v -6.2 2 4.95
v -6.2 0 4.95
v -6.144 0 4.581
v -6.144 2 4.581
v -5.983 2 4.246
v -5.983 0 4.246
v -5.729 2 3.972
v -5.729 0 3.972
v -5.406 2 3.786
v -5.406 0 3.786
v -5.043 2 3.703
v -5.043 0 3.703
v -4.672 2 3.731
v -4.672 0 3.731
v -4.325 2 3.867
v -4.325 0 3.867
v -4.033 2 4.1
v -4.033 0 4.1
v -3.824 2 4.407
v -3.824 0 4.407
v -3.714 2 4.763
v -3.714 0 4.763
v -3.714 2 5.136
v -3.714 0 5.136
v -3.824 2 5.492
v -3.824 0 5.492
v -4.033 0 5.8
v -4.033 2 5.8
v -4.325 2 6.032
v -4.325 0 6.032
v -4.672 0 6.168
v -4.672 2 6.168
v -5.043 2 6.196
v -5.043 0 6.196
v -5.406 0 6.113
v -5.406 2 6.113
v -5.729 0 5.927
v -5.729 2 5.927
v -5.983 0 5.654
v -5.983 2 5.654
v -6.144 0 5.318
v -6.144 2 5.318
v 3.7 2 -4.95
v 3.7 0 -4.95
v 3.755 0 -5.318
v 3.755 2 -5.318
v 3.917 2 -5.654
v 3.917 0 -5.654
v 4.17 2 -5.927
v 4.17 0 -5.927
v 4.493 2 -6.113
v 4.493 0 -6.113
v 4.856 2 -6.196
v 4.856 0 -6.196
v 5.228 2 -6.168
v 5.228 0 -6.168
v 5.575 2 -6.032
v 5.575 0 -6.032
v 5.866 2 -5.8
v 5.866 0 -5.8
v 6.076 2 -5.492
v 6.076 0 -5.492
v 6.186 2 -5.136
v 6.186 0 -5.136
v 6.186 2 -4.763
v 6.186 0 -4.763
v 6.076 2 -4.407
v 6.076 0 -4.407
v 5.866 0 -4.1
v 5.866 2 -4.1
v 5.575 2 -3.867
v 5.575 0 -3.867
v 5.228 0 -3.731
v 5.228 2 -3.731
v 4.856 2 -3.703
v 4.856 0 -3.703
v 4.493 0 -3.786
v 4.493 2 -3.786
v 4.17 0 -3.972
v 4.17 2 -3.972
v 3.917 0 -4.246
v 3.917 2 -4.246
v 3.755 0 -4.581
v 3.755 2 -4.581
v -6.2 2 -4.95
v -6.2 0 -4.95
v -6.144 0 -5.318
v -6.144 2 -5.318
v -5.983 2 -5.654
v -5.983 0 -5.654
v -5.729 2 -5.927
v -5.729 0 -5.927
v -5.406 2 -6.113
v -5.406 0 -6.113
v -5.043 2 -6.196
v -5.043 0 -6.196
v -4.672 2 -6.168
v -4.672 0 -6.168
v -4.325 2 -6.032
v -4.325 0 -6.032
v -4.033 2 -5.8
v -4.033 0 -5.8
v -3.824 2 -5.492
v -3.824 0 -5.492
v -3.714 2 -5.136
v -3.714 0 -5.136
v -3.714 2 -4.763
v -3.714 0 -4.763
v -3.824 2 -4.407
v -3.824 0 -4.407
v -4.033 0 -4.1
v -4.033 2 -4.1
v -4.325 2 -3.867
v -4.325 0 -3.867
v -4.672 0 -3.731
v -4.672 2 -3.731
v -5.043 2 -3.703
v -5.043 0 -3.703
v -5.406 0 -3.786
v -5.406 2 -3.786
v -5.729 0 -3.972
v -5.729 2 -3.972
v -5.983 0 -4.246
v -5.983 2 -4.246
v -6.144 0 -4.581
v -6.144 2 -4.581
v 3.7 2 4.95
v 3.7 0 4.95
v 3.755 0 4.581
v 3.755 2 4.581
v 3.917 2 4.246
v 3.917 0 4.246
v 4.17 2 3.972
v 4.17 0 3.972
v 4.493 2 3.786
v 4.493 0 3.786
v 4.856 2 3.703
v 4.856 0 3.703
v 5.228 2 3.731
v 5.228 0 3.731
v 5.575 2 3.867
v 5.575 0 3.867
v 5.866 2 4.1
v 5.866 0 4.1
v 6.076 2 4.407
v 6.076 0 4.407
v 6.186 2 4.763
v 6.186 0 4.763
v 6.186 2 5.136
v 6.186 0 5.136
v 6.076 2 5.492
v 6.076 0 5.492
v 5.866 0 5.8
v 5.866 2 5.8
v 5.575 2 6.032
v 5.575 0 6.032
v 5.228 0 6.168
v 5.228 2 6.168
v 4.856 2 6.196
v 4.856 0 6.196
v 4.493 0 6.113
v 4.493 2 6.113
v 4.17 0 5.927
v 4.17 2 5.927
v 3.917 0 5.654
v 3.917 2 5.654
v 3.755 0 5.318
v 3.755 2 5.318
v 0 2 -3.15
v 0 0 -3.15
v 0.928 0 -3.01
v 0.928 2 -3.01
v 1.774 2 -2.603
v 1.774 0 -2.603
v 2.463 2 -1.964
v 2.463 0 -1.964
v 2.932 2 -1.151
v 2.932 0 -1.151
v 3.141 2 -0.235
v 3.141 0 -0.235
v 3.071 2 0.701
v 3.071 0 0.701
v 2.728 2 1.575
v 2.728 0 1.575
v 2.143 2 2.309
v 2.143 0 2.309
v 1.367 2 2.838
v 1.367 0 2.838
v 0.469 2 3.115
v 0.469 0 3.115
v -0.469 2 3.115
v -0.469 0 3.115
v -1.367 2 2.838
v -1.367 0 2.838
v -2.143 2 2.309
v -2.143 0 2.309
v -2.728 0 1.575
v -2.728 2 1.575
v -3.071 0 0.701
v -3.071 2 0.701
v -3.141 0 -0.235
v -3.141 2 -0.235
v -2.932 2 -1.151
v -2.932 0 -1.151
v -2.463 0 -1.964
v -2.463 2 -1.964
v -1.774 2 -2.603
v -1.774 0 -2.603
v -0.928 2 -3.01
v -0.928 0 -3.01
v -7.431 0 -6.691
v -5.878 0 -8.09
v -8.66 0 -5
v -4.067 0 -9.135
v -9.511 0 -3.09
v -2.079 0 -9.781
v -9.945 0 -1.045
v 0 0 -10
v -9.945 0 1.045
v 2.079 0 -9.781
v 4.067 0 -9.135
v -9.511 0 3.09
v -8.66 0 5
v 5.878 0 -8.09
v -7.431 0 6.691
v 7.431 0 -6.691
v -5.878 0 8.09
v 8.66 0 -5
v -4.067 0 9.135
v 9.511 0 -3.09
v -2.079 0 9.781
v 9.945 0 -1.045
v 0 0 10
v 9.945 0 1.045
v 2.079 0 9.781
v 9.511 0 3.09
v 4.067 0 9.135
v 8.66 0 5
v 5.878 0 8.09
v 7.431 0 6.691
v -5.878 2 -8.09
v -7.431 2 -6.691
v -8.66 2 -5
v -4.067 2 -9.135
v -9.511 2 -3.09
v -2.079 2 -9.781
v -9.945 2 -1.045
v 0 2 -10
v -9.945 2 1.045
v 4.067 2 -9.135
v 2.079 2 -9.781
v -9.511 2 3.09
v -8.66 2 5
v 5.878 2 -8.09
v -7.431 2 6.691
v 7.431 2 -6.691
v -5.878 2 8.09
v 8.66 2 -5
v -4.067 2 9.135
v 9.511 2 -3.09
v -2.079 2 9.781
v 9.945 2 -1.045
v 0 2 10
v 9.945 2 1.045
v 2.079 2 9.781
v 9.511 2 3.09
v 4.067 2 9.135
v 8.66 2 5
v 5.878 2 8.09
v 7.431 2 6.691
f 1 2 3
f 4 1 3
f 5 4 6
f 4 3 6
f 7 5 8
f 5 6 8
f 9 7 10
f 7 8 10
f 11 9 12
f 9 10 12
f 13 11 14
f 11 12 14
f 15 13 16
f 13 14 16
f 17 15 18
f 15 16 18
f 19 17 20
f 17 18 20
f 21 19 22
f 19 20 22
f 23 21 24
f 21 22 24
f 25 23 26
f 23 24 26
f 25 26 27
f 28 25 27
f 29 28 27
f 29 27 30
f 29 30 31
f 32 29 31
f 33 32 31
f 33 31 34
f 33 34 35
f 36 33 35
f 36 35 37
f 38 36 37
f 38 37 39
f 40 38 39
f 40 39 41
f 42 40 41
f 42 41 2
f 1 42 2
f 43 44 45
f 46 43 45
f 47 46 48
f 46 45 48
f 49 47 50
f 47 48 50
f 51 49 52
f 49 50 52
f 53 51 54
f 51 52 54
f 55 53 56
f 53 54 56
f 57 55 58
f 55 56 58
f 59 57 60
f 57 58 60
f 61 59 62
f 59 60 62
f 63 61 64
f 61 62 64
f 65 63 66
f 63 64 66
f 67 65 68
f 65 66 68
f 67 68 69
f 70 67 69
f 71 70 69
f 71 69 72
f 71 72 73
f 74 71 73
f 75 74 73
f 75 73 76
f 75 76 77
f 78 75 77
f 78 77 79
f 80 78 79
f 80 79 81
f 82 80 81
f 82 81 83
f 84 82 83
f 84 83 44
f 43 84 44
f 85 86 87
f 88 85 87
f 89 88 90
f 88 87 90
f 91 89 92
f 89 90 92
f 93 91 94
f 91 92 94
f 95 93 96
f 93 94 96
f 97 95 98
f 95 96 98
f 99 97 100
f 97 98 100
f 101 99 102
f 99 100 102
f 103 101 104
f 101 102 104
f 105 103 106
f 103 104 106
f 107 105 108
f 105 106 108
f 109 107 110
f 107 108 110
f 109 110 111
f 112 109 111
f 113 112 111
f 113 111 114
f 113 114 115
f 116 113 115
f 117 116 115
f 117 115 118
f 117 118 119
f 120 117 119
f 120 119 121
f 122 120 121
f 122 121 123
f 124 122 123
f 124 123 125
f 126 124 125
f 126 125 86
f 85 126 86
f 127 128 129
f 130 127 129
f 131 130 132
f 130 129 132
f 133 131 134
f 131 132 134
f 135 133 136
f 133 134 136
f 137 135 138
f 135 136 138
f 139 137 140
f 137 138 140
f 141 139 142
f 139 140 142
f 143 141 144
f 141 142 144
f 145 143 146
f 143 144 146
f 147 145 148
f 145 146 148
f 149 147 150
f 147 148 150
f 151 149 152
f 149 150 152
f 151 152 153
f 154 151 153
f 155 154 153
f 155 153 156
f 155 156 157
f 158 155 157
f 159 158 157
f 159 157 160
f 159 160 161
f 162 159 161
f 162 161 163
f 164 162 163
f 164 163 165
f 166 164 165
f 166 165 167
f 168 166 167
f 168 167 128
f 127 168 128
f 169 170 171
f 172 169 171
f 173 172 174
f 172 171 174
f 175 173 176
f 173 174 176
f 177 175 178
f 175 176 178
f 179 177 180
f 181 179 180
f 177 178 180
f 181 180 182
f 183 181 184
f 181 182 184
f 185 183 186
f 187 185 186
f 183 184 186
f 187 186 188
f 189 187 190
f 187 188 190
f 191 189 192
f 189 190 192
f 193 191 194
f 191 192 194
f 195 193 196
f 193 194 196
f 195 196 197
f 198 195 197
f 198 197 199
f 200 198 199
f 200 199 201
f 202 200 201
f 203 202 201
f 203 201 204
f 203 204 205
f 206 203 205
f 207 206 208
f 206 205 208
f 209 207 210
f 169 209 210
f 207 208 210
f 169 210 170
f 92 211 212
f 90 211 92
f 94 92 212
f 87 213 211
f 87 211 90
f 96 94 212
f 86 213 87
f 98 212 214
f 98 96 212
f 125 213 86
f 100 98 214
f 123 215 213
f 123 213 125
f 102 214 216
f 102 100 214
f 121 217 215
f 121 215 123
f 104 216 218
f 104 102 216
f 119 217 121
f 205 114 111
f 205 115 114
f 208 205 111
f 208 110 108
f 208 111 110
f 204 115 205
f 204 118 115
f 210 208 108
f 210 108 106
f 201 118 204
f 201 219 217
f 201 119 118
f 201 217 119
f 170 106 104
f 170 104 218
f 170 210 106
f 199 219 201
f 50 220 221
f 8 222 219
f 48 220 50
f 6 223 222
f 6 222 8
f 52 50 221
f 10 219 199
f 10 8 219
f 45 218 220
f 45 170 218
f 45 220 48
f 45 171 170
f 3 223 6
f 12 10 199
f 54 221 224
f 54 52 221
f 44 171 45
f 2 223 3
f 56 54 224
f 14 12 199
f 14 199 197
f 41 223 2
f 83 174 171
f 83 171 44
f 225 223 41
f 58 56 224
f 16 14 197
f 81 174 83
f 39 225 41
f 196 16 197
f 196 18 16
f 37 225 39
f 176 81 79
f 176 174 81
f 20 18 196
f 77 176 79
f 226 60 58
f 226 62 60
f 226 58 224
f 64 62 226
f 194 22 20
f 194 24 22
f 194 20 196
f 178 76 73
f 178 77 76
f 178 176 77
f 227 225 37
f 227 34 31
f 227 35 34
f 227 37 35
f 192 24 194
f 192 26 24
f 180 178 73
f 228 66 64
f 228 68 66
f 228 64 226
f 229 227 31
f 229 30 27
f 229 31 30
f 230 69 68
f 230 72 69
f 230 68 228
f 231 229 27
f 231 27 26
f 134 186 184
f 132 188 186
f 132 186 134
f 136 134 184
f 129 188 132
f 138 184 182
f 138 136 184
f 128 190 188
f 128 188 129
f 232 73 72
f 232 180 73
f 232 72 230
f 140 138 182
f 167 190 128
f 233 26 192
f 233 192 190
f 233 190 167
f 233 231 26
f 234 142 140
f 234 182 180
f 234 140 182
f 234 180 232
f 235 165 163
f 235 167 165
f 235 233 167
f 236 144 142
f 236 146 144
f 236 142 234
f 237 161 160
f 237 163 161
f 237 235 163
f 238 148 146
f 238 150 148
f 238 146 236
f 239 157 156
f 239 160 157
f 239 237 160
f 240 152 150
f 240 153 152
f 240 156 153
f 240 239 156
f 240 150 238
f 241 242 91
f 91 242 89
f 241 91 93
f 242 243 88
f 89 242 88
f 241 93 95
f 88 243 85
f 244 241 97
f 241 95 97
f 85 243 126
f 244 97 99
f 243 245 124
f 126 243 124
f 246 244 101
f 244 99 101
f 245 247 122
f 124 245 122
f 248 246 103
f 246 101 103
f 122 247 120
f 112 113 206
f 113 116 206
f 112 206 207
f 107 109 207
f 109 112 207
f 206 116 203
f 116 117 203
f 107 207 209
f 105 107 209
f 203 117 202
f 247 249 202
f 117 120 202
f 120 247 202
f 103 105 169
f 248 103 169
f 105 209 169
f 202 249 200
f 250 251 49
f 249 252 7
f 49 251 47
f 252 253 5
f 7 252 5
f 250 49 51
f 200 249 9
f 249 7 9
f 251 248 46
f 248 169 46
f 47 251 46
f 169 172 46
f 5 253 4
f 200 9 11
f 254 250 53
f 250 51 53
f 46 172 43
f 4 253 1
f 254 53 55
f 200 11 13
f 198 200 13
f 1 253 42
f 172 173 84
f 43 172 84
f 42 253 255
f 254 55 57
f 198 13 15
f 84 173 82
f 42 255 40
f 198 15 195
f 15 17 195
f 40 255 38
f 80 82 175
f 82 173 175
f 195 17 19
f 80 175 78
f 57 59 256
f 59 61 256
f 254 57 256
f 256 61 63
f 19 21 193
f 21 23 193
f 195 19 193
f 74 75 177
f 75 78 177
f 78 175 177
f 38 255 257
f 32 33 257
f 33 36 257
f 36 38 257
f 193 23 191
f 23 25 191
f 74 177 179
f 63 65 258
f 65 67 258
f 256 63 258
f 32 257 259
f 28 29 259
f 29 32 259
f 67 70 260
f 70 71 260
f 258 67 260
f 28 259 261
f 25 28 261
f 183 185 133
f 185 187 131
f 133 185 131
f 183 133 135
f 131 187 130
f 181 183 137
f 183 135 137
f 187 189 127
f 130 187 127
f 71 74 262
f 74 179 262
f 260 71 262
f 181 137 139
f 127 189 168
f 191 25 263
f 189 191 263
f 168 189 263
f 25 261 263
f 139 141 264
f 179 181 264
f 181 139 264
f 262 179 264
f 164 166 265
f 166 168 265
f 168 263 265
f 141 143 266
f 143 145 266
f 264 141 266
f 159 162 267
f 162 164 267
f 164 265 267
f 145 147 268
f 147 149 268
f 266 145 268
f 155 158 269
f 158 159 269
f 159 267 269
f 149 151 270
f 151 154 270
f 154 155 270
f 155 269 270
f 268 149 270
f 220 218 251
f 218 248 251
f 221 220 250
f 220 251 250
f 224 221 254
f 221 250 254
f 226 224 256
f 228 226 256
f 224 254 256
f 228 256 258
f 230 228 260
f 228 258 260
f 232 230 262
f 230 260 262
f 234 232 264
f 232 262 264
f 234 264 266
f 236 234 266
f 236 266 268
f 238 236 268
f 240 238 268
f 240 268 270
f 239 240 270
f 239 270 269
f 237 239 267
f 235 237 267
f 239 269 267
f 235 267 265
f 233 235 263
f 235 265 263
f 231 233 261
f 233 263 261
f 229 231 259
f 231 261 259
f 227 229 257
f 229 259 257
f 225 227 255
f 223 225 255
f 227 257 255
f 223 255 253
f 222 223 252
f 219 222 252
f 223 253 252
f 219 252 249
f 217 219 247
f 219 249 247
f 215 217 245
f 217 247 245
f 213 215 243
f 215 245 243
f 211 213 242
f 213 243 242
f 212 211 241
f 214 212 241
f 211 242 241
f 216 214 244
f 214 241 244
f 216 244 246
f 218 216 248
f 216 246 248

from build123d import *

# Parameters (mm, degrees)
SKETCH_1_W              = 10
SKETCH_1_H              = 2
SKETCH_2_R              = 4.5
EXTRUDE_1_DEPTH         = 2.5
CUT_EXTRUDE_1_DEPTH     = 3.6
HOLE_WIZARD_3_0_3_1_D   = 3
HOLE_WIZARD_2_5_2_5_1_D = 2.5
CHAMFER_1_SIZE          = 0.140560122
CHAMFER_1_EDGE_2_SIZE   = 0.140560122
CHAMFER_1_EDGE_3_SIZE   = 0.140560122
CHAMFER_1_EDGE_4_SIZE   = 0.140560122
CHAMFER_1_EDGE_5_SIZE   = 0.140560122
CHAMFER_1_EDGE_6_SIZE   = 0.140560122
CHAMFER_1_EDGE_7_SIZE   = 0.140560122
CHAMFER_1_EDGE_8_SIZE   = 0.140560122
CHAMFER_1_EDGE_9_SIZE   = 0.140560122
CHAMFER_1_EDGE_10_SIZE  = 0.140560122
CHAMFER_1_EDGE_11_SIZE  = 0.140560122
CHAMFER_1_EDGE_12_SIZE  = 0.140560122
CHAMFER_1_EDGE_13_SIZE  = 0.140560122
CHAMFER_1_EDGE_14_SIZE  = 0.140560122
CHAMFER_1_EDGE_15_SIZE  = 0.140560122
CHAMFER_1_EDGE_16_SIZE  = 0.140560122
CHAMFER_1_EDGE_17_SIZE  = 0.140560122
CHAMFER_1_EDGE_18_SIZE  = 0.140560122
CHAMFER_1_EDGE_19_SIZE  = 0.140560122
CHAMFER_1_EDGE_20_SIZE  = 0.140560122
CHAMFER_1_EDGE_21_SIZE  = 0.140560122
CHAMFER_1_EDGE_22_SIZE  = 0.140560122
CHAMFER_1_EDGE_23_SIZE  = 0.140560122
CHAMFER_1_EDGE_24_SIZE  = 0.140560122
CHAMFER_1_EDGE_25_SIZE  = 0.140560122
CHAMFER_1_EDGE_26_SIZE  = 0.140560122
SKETCH_8_R              = 4.5
CUT_EXTRUDE_2_DEPTH     = 4.5
SKETCH_9_R              = 4.5
SKETCH_9_R_2            = 3.15
EXTRUDE_2_DEPTH         = 2


with BuildPart() as part:
    # Эскиз1 → Повернуть1 (revolve)
    with BuildSketch(Plane.XY, mode=Mode.PRIVATE) as revolve_1_sk:
        with Locations((5, 1)):
            Rectangle(SKETCH_1_W, SKETCH_1_H)
    revolve(revolve_1_sk.sketch.rotate(Axis((0, 2, 0), (0, -1, 0)), 270), axis=Axis((0, 2, 0), (0, -1, 0)))

    # Эскиз2 → Бобышка-Вытянуть1 (add)
    with BuildSketch(Plane(origin=(0, 2, 0), x_dir=(-1, 0, 0), z_dir=(0, 1, 0))):
        with Locations(Location((0, 0, 0), (0, 0, 90))):
            Circle(SKETCH_2_R)
    extrude(amount=EXTRUDE_1_DEPTH)

    # Эскиз3 → Вырез-Вытянуть1 (cut)
    with BuildSketch(Plane(origin=(0, 4.5, 0), x_dir=(-1, 0, 0), z_dir=(0, 1, 0))):
        Polygon((-2.711547104, 1.028354172), (-2.477853855, 0.610736123), (-2.878855735, 0.349556373), (-2.552010646, 0), (-2.878855735, -0.349556373), (-2.477853855, -0.610736123), (-2.711547104, -1.028354172), (-2.259693204, -1.185978483), (-2.386653211, -1.647387766), (-1.910207398, -1.692296084), (-1.923055709, -2.17068117), (-1.449707281, -2.100263587), (-1.347697199, -2.567822474), (-0.904955447, -2.386171406), (-0.694015426, -2.815731271), (-0.307610891, -2.533403615), (0, -2.9), (0.307610891, -2.533403615), (0.694015426, -2.815731271), (0.904955447, -2.386171406), (1.347697199, -2.567822474), (1.449707281, -2.100263587), (1.923055709, -2.17068117), (1.910207398, -1.692296084), (2.386653211, -1.647387766), (2.259693204, -1.185978483), (2.711547104, -1.028354172), (2.477853855, -0.610736123), (2.878855735, -0.349556373), (2.552010646, 0), (2.878855735, 0.349556373), (2.477853855, 0.610736123), (2.711547104, 1.028354172), (2.259693204, 1.185978483), (2.386653211, 1.647387766), (1.910207398, 1.692296084), (1.923055709, 2.17068117), (1.449707281, 2.100263587), (1.347697199, 2.567822474), (0.904955447, 2.386171406), (0.694015426, 2.815731271), (0.307610891, 2.533403615), (0, 2.9), (-0.307610891, 2.533403615), (-0.694015426, 2.815731271), (-0.904955447, 2.386171406), (-1.347697199, 2.567822474), (-1.449707281, 2.100263587), (-1.923055709, 2.17068117), (-1.910207398, 1.692296084), (-2.386653211, 1.647387766), (-2.259693204, 1.185978483), align=None)
    extrude(amount=-CUT_EXTRUDE_1_DEPTH, mode=Mode.SUBTRACT)

    # Диаметр отверстия Ø3.0 (3)1 (through all)
    with Locations(Plane(origin=(0, 0.9, 0), x_dir=(1, 0, 0), z_dir=(0, 1, 0))):
        with Locations((0, 0)):
            Hole(HOLE_WIZARD_3_0_3_1_D / 2)

    # Диаметр отверстия Ø2.5 (2.5)1 (through all)
    with Locations(Plane(origin=(0, 2, 0), x_dir=(1, 0, 0), z_dir=(0, 1, 0))):
        with Locations((-4.949747468, 4.949747468), (4.949747468, 4.949747468), (4.949747468, -4.949747468), (-4.949747468, -4.949747468)):
            Hole(HOLE_WIZARD_2_5_2_5_1_D / 2)

    # Фаска1
    chamfer_1_edges = [part.edges().sort_by_distance(p)[0] for p in [
        (2.259693204, 2.7, 1.185978483),
    ]]
    chamfer(chamfer_1_edges, length=CHAMFER_1_SIZE)

    # Фаска1 edge 2
    chamfer_1_edge_2_edges = [part.edges().sort_by_distance(p)[0] for p in [
        (1.910207398, 2.7, 1.692296084),
    ]]
    chamfer(chamfer_1_edge_2_edges, length=CHAMFER_1_EDGE_2_SIZE)

    # Фаска1 edge 3
    chamfer_1_edge_3_edges = [part.edges().sort_by_distance(p)[0] for p in [
        (1.449707281, 2.7, 2.100263587),
    ]]
    chamfer(chamfer_1_edge_3_edges, length=CHAMFER_1_EDGE_3_SIZE)

    # Фаска1 edge 4
    chamfer_1_edge_4_edges = [part.edges().sort_by_distance(p)[0] for p in [
        (0.904955447, 2.7, 2.386171406),
    ]]
    chamfer(chamfer_1_edge_4_edges, length=CHAMFER_1_EDGE_4_SIZE)

    # Фаска1 edge 5
    chamfer_1_edge_5_edges = [part.edges().sort_by_distance(p)[0] for p in [
        (0.307610891, 2.7, 2.533403615),
    ]]
    chamfer(chamfer_1_edge_5_edges, length=CHAMFER_1_EDGE_5_SIZE)

    # Фаска1 edge 6
    chamfer_1_edge_6_edges = [part.edges().sort_by_distance(p)[0] for p in [
        (-0.307610891, 2.7, 2.533403615),
    ]]
    chamfer(chamfer_1_edge_6_edges, length=CHAMFER_1_EDGE_6_SIZE)

    # Фаска1 edge 7
    chamfer_1_edge_7_edges = [part.edges().sort_by_distance(p)[0] for p in [
        (-0.904955447, 2.7, 2.386171406),
    ]]
    chamfer(chamfer_1_edge_7_edges, length=CHAMFER_1_EDGE_7_SIZE)

    # Фаска1 edge 8
    chamfer_1_edge_8_edges = [part.edges().sort_by_distance(p)[0] for p in [
        (-1.449707281, 2.7, 2.100263587),
    ]]
    chamfer(chamfer_1_edge_8_edges, length=CHAMFER_1_EDGE_8_SIZE)

    # Фаска1 edge 9
    chamfer_1_edge_9_edges = [part.edges().sort_by_distance(p)[0] for p in [
        (-1.910207398, 2.7, 1.692296084),
    ]]
    chamfer(chamfer_1_edge_9_edges, length=CHAMFER_1_EDGE_9_SIZE)

    # Фаска1 edge 10
    chamfer_1_edge_10_edges = [part.edges().sort_by_distance(p)[0] for p in [
        (-2.259693204, 2.7, 1.185978483),
    ]]
    chamfer(chamfer_1_edge_10_edges, length=CHAMFER_1_EDGE_10_SIZE)

    # Фаска1 edge 11
    chamfer_1_edge_11_edges = [part.edges().sort_by_distance(p)[0] for p in [
        (-2.477853855, 2.7, 0.610736123),
    ]]
    chamfer(chamfer_1_edge_11_edges, length=CHAMFER_1_EDGE_11_SIZE)

    # Фаска1 edge 12
    chamfer_1_edge_12_edges = [part.edges().sort_by_distance(p)[0] for p in [
        (-2.552010646, 2.7, 0),
    ]]
    chamfer(chamfer_1_edge_12_edges, length=CHAMFER_1_EDGE_12_SIZE)

    # Фаска1 edge 13
    chamfer_1_edge_13_edges = [part.edges().sort_by_distance(p)[0] for p in [
        (-2.477853855, 2.7, -0.610736123),
    ]]
    chamfer(chamfer_1_edge_13_edges, length=CHAMFER_1_EDGE_13_SIZE)

    # Фаска1 edge 14
    chamfer_1_edge_14_edges = [part.edges().sort_by_distance(p)[0] for p in [
        (-2.259693204, 2.7, -1.185978483),
    ]]
    chamfer(chamfer_1_edge_14_edges, length=CHAMFER_1_EDGE_14_SIZE)

    # Фаска1 edge 15
    chamfer_1_edge_15_edges = [part.edges().sort_by_distance(p)[0] for p in [
        (-1.910207398, 2.7, -1.692296084),
    ]]
    chamfer(chamfer_1_edge_15_edges, length=CHAMFER_1_EDGE_15_SIZE)

    # Фаска1 edge 16
    chamfer_1_edge_16_edges = [part.edges().sort_by_distance(p)[0] for p in [
        (-1.449707281, 2.7, -2.100263587),
    ]]
    chamfer(chamfer_1_edge_16_edges, length=CHAMFER_1_EDGE_16_SIZE)

    # Фаска1 edge 17
    chamfer_1_edge_17_edges = [part.edges().sort_by_distance(p)[0] for p in [
        (-0.904955447, 2.7, -2.386171406),
    ]]
    chamfer(chamfer_1_edge_17_edges, length=CHAMFER_1_EDGE_17_SIZE)

    # Фаска1 edge 18
    chamfer_1_edge_18_edges = [part.edges().sort_by_distance(p)[0] for p in [
        (-0.307610891, 2.7, -2.533403615),
    ]]
    chamfer(chamfer_1_edge_18_edges, length=CHAMFER_1_EDGE_18_SIZE)

    # Фаска1 edge 19
    chamfer_1_edge_19_edges = [part.edges().sort_by_distance(p)[0] for p in [
        (0.307610891, 2.7, -2.533403615),
    ]]
    chamfer(chamfer_1_edge_19_edges, length=CHAMFER_1_EDGE_19_SIZE)

    # Фаска1 edge 20
    chamfer_1_edge_20_edges = [part.edges().sort_by_distance(p)[0] for p in [
        (0.904955447, 2.7, -2.386171406),
    ]]
    chamfer(chamfer_1_edge_20_edges, length=CHAMFER_1_EDGE_20_SIZE)

    # Фаска1 edge 21
    chamfer_1_edge_21_edges = [part.edges().sort_by_distance(p)[0] for p in [
        (1.449707281, 2.7, -2.100263587),
    ]]
    chamfer(chamfer_1_edge_21_edges, length=CHAMFER_1_EDGE_21_SIZE)

    # Фаска1 edge 22
    chamfer_1_edge_22_edges = [part.edges().sort_by_distance(p)[0] for p in [
        (1.910207398, 2.7, -1.692296084),
    ]]
    chamfer(chamfer_1_edge_22_edges, length=CHAMFER_1_EDGE_22_SIZE)

    # Фаска1 edge 23
    chamfer_1_edge_23_edges = [part.edges().sort_by_distance(p)[0] for p in [
        (2.259693204, 2.7, -1.185978483),
    ]]
    chamfer(chamfer_1_edge_23_edges, length=CHAMFER_1_EDGE_23_SIZE)

    # Фаска1 edge 24
    chamfer_1_edge_24_edges = [part.edges().sort_by_distance(p)[0] for p in [
        (2.477853855, 2.7, -0.610736123),
    ]]
    chamfer(chamfer_1_edge_24_edges, length=CHAMFER_1_EDGE_24_SIZE)

    # Фаска1 edge 25
    chamfer_1_edge_25_edges = [part.edges().sort_by_distance(p)[0] for p in [
        (2.552010646, 2.7, 0),
    ]]
    chamfer(chamfer_1_edge_25_edges, length=CHAMFER_1_EDGE_25_SIZE)

    # Фаска1 edge 26
    chamfer_1_edge_26_edges = [part.edges().sort_by_distance(p)[0] for p in [
        (2.477853855, 2.7, 0.610736123),
    ]]
    chamfer(chamfer_1_edge_26_edges, length=CHAMFER_1_EDGE_26_SIZE)

    # Эскиз8 → Вырез-Вытянуть2 (cut)
    with BuildSketch(Plane(origin=(0, 4.5, 0), x_dir=(1, 0, 0), z_dir=(0, 1, 0))):
        with Locations(Location((0, 0, 0), (0, 0, 270))):
            Circle(SKETCH_8_R)
    extrude(amount=-CUT_EXTRUDE_2_DEPTH, mode=Mode.SUBTRACT)

    # Эскиз9 → Бобышка-Вытянуть2 (add)
    with BuildSketch(Plane.XZ):
        Circle(SKETCH_9_R)
        with Locations(Location((0, 0, 0), (0, 0, 270))):
            Circle(SKETCH_9_R_2, mode=Mode.SUBTRACT)
    extrude(amount=-EXTRUDE_2_DEPTH)


solid = part.part
